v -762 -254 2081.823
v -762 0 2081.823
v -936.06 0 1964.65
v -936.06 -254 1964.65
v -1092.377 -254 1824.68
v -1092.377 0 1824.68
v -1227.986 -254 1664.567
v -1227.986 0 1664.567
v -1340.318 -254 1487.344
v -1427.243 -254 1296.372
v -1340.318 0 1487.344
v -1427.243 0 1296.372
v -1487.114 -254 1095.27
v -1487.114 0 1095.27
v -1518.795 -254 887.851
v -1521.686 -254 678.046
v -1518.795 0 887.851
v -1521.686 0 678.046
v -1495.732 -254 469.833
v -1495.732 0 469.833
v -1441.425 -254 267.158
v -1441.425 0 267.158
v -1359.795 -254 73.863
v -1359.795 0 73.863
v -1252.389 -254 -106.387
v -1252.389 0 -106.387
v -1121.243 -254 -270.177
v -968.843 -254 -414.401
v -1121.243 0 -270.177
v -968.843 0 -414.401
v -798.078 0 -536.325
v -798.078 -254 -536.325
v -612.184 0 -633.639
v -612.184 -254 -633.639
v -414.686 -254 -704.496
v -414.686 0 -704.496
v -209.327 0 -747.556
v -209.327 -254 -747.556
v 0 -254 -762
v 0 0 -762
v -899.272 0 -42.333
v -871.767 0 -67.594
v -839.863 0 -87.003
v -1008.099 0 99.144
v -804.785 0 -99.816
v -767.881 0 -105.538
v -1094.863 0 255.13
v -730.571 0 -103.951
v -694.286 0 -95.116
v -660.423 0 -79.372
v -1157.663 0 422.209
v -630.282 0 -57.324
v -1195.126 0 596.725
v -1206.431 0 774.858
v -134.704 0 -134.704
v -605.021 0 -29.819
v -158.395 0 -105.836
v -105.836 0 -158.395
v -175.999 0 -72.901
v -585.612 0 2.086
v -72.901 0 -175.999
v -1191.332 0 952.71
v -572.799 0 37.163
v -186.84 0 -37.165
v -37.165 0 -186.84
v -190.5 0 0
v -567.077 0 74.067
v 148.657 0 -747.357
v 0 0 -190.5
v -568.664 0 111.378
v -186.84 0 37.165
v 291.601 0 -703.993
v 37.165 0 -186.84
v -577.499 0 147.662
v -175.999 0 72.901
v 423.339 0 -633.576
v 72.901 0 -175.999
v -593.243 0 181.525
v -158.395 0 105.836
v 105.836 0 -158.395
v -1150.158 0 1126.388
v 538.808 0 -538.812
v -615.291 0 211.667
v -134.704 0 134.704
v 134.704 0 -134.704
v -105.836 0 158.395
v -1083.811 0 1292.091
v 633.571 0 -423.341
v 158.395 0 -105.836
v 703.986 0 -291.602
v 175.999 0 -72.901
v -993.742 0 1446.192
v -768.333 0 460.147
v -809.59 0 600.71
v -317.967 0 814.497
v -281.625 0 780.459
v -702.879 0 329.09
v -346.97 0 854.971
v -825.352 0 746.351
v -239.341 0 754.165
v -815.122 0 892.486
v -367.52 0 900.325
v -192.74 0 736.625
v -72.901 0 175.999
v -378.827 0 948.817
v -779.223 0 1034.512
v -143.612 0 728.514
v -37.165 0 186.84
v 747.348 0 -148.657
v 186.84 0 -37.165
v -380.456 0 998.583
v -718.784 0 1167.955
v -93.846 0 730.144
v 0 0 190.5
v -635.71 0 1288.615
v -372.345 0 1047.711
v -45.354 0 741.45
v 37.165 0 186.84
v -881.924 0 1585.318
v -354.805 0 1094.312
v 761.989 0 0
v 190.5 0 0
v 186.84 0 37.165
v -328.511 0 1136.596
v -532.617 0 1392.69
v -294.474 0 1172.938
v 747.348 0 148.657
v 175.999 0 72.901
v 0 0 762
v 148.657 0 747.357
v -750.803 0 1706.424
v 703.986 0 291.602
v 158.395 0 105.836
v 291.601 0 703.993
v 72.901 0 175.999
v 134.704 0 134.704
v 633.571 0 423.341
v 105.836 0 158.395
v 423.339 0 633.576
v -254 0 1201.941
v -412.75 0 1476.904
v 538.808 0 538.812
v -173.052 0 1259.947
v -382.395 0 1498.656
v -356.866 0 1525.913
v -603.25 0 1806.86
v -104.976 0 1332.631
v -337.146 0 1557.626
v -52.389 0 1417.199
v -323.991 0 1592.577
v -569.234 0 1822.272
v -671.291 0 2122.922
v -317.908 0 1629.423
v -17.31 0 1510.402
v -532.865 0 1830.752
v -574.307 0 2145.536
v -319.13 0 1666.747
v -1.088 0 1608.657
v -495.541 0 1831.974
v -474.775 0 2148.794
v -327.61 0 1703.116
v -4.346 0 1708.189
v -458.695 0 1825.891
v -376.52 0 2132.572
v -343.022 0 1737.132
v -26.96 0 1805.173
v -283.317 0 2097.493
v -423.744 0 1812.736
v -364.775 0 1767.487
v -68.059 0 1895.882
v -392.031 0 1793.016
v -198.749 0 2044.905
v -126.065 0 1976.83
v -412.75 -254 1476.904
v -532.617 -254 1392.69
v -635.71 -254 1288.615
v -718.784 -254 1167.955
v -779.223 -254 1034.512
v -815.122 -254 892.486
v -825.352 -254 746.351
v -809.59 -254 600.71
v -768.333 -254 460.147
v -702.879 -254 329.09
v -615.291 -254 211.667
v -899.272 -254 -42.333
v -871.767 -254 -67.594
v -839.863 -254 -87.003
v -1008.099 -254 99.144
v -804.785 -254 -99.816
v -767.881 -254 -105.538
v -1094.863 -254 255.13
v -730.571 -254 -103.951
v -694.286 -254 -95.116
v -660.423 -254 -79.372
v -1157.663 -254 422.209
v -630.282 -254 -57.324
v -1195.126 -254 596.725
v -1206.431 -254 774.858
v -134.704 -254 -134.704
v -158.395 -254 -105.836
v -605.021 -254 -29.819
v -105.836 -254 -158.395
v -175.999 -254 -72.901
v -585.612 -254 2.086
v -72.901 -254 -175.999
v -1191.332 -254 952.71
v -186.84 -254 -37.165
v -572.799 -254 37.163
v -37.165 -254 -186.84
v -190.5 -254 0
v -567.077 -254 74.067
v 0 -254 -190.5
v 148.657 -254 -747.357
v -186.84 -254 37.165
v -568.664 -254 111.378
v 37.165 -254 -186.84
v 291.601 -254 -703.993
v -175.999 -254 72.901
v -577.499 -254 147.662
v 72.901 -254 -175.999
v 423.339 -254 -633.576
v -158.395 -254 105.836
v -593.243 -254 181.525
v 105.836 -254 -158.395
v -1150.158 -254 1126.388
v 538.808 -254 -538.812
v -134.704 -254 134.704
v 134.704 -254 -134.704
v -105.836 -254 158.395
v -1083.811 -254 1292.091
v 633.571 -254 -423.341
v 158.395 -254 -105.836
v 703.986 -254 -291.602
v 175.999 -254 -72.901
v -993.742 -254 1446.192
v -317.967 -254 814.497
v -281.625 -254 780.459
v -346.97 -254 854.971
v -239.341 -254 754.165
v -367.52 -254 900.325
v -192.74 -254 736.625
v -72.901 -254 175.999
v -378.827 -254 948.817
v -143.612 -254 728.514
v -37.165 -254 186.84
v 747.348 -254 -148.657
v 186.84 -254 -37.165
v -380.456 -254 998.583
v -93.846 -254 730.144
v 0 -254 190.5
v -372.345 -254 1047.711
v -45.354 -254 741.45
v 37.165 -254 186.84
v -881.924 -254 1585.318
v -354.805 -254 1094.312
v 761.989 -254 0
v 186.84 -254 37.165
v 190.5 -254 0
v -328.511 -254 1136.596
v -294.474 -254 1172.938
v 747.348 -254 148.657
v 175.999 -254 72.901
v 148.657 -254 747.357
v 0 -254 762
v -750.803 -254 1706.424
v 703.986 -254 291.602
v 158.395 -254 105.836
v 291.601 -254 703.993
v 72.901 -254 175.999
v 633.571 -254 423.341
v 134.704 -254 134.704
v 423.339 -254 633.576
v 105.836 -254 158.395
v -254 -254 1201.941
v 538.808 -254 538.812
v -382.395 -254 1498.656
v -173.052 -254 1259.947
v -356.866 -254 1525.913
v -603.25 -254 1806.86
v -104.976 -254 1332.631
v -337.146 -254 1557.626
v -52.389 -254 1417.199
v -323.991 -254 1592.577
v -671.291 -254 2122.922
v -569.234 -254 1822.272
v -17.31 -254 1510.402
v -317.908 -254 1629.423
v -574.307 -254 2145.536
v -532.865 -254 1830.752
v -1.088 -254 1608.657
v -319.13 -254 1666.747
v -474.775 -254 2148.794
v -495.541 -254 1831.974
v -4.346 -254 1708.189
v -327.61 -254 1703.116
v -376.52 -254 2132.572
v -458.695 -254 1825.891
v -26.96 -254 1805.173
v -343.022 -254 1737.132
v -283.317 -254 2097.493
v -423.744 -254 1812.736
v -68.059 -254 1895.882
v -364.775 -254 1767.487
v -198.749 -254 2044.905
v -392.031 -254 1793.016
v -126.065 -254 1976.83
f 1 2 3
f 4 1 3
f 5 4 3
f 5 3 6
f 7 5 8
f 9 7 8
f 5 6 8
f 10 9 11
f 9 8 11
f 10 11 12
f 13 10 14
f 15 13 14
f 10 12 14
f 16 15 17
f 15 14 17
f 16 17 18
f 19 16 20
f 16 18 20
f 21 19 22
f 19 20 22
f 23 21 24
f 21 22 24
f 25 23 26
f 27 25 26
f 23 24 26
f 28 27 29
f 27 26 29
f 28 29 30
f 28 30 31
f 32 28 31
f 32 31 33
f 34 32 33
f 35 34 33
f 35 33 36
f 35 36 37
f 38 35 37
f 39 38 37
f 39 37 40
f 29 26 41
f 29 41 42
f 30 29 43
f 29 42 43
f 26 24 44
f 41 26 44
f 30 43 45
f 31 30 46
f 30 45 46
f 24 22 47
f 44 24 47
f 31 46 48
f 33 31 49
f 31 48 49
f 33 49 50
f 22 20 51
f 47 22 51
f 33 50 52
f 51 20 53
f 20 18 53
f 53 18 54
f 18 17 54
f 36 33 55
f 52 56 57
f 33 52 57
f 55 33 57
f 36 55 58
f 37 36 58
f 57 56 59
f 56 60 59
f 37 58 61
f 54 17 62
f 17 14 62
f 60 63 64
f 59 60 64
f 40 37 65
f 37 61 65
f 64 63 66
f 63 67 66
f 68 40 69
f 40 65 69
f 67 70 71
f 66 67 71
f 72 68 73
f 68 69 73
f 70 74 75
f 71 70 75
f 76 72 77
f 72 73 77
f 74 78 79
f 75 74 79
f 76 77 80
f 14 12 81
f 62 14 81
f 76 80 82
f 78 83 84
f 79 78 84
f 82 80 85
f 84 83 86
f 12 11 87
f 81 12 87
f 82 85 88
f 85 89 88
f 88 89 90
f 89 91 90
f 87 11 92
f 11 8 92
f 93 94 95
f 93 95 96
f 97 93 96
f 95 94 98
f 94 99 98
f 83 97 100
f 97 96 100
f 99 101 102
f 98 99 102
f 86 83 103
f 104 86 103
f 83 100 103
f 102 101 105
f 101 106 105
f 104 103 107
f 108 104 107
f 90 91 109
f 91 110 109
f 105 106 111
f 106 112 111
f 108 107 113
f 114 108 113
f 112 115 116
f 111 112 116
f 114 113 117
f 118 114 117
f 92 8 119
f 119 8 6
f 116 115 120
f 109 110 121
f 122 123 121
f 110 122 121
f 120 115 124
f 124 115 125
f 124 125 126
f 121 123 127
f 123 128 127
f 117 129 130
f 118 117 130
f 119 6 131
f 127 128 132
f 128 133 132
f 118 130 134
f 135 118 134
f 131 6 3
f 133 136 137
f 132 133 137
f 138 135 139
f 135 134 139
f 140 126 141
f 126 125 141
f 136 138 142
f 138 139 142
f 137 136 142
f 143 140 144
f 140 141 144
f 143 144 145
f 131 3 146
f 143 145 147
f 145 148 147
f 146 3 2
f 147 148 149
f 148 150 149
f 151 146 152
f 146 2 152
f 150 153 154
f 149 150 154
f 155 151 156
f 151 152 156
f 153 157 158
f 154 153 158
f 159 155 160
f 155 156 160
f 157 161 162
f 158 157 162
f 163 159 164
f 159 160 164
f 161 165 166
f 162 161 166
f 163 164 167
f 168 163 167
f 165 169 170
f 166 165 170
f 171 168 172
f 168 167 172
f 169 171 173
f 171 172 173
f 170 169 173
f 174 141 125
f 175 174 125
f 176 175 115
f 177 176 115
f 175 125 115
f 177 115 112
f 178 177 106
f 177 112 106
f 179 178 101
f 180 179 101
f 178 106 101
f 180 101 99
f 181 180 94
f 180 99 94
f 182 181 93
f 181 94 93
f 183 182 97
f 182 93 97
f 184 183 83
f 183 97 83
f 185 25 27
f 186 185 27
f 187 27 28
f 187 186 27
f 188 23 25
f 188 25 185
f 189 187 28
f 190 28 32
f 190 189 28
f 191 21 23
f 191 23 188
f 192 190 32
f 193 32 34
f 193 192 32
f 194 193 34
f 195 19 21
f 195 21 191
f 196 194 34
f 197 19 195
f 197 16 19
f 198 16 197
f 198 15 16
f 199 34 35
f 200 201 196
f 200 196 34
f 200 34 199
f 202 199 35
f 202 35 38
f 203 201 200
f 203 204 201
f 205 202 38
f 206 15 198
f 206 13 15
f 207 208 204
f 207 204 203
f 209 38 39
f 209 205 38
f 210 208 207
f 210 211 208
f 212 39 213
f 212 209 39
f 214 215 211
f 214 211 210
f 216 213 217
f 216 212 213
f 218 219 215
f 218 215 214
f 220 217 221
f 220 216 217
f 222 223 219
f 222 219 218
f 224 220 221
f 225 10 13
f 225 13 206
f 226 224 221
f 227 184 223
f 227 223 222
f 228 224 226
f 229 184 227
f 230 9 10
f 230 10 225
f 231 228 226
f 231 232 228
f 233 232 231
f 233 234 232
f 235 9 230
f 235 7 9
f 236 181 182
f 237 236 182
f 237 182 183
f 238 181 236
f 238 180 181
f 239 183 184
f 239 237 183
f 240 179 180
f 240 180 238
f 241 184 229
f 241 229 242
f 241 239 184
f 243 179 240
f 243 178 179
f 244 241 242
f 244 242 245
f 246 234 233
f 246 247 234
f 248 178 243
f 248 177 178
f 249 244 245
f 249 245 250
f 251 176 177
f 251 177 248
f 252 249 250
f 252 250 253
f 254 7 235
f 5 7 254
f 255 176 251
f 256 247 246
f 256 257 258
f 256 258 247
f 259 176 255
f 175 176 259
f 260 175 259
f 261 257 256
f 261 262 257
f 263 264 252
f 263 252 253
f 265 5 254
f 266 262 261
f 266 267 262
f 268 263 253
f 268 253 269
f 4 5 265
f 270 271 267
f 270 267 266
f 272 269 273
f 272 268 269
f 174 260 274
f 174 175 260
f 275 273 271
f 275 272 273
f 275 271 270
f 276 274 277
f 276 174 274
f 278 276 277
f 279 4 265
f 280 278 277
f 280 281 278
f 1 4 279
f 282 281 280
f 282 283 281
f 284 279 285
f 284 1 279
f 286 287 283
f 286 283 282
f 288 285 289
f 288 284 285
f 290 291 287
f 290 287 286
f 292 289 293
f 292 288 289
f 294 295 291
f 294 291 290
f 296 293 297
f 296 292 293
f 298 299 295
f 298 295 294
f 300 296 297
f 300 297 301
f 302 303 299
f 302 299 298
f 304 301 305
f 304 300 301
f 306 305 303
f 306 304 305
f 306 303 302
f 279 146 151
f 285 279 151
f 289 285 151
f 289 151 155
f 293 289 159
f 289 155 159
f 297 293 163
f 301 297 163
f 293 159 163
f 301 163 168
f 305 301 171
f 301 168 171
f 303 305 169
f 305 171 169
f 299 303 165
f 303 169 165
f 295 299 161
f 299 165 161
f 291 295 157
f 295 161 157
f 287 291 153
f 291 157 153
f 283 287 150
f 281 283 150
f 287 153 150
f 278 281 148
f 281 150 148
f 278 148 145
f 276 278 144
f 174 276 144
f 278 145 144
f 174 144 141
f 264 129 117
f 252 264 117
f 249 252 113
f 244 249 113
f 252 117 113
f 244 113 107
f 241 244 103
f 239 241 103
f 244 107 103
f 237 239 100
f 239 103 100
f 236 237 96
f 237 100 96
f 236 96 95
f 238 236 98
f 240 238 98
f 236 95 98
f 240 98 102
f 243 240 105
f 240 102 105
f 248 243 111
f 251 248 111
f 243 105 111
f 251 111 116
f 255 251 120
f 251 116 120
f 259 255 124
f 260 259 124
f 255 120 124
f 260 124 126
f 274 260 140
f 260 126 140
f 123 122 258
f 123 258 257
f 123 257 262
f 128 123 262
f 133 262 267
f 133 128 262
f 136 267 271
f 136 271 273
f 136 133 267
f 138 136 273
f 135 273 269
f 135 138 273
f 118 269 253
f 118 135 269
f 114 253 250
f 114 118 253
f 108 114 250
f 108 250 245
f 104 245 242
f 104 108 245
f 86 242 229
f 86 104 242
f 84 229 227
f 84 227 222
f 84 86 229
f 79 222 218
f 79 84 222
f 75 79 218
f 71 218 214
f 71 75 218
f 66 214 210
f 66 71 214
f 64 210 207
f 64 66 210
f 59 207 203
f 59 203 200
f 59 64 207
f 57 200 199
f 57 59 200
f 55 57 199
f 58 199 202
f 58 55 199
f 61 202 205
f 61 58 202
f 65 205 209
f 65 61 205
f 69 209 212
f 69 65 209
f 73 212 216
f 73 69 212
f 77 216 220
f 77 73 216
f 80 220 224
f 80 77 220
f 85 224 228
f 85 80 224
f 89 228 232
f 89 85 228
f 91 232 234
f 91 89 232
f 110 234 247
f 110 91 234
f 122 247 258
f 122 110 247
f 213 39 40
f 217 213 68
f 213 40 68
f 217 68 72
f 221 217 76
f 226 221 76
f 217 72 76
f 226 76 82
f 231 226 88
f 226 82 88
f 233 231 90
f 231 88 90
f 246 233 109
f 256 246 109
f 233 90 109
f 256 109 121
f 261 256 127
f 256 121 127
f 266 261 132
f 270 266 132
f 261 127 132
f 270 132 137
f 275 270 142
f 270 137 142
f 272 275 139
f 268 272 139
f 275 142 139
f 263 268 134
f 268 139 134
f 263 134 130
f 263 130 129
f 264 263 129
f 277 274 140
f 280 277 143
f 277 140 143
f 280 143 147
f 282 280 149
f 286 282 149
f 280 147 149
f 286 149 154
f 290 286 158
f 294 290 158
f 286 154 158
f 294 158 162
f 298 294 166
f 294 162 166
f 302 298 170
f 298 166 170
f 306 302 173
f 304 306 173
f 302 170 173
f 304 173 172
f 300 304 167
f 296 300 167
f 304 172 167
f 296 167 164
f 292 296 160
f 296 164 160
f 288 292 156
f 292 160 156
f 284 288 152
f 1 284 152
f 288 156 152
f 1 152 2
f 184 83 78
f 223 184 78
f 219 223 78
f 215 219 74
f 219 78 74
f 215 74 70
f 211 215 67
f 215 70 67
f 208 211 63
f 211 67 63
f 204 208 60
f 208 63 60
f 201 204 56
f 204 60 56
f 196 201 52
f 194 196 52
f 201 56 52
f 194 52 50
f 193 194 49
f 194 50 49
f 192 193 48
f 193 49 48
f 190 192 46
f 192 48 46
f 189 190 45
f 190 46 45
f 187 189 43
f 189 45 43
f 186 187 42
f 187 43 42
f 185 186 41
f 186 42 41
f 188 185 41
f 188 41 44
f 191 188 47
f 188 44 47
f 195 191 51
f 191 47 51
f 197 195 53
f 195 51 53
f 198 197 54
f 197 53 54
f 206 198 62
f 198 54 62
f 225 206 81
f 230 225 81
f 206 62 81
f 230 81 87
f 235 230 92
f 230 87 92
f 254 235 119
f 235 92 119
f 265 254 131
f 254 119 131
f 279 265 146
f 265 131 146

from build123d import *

# Parameters (mm, degrees)
F0_R     = 190.5
F1_DEPTH = 254


# Not quite as in the source:
# - ends of sketch curves that miss each other by under 0.0002 mm in the source are joined


with BuildPart() as f1:
    # F0 (on Front) → F1 (new body)
    with BuildSketch(Plane.XZ):
        with BuildLine():
            ThreePointArc((-253.9996830053, 1201.9410881396), (-68.0591863861, 1895.8819687424), (-762, 2081.8227153675))
            ThreePointArc((-762, 2081.8227153675), (-1472.0709592645, 367.5597752638), (0, -762))
            ThreePointArc((0, -762), (761.9891288024, -7.75e-08), (0, 761.9999998449))
            ThreePointArc((0, 761.9999998449), (-346.9703855723, 854.9707025672), (-253.9996830053, 1201.9410881396))
        make_face()
        Circle(F0_R, mode=Mode.SUBTRACT)
        with BuildLine():
            ThreePointArc((-603.25, 1806.8596496659), (-343.0221605791, 1737.131810245), (-412.75, 1476.9039708241))
            ThreePointArc((-412.75, 1476.9039708241), (-815.1218466146, 892.4861122222), (-615.2913719088, 211.666666422))
            ThreePointArc((-615.2913719088, 211.666666422), (-630.28168848, -57.3236501492), (-899.2720050513, -42.333333578))
            ThreePointArc((-899.2720050513, -42.333333578), (-1191.3319294955, 952.7104717353), (-603.25, 1806.8596496659))
        make_face(mode=Mode.SUBTRACT)
    extrude(amount=F1_DEPTH)


solid = f1.part
